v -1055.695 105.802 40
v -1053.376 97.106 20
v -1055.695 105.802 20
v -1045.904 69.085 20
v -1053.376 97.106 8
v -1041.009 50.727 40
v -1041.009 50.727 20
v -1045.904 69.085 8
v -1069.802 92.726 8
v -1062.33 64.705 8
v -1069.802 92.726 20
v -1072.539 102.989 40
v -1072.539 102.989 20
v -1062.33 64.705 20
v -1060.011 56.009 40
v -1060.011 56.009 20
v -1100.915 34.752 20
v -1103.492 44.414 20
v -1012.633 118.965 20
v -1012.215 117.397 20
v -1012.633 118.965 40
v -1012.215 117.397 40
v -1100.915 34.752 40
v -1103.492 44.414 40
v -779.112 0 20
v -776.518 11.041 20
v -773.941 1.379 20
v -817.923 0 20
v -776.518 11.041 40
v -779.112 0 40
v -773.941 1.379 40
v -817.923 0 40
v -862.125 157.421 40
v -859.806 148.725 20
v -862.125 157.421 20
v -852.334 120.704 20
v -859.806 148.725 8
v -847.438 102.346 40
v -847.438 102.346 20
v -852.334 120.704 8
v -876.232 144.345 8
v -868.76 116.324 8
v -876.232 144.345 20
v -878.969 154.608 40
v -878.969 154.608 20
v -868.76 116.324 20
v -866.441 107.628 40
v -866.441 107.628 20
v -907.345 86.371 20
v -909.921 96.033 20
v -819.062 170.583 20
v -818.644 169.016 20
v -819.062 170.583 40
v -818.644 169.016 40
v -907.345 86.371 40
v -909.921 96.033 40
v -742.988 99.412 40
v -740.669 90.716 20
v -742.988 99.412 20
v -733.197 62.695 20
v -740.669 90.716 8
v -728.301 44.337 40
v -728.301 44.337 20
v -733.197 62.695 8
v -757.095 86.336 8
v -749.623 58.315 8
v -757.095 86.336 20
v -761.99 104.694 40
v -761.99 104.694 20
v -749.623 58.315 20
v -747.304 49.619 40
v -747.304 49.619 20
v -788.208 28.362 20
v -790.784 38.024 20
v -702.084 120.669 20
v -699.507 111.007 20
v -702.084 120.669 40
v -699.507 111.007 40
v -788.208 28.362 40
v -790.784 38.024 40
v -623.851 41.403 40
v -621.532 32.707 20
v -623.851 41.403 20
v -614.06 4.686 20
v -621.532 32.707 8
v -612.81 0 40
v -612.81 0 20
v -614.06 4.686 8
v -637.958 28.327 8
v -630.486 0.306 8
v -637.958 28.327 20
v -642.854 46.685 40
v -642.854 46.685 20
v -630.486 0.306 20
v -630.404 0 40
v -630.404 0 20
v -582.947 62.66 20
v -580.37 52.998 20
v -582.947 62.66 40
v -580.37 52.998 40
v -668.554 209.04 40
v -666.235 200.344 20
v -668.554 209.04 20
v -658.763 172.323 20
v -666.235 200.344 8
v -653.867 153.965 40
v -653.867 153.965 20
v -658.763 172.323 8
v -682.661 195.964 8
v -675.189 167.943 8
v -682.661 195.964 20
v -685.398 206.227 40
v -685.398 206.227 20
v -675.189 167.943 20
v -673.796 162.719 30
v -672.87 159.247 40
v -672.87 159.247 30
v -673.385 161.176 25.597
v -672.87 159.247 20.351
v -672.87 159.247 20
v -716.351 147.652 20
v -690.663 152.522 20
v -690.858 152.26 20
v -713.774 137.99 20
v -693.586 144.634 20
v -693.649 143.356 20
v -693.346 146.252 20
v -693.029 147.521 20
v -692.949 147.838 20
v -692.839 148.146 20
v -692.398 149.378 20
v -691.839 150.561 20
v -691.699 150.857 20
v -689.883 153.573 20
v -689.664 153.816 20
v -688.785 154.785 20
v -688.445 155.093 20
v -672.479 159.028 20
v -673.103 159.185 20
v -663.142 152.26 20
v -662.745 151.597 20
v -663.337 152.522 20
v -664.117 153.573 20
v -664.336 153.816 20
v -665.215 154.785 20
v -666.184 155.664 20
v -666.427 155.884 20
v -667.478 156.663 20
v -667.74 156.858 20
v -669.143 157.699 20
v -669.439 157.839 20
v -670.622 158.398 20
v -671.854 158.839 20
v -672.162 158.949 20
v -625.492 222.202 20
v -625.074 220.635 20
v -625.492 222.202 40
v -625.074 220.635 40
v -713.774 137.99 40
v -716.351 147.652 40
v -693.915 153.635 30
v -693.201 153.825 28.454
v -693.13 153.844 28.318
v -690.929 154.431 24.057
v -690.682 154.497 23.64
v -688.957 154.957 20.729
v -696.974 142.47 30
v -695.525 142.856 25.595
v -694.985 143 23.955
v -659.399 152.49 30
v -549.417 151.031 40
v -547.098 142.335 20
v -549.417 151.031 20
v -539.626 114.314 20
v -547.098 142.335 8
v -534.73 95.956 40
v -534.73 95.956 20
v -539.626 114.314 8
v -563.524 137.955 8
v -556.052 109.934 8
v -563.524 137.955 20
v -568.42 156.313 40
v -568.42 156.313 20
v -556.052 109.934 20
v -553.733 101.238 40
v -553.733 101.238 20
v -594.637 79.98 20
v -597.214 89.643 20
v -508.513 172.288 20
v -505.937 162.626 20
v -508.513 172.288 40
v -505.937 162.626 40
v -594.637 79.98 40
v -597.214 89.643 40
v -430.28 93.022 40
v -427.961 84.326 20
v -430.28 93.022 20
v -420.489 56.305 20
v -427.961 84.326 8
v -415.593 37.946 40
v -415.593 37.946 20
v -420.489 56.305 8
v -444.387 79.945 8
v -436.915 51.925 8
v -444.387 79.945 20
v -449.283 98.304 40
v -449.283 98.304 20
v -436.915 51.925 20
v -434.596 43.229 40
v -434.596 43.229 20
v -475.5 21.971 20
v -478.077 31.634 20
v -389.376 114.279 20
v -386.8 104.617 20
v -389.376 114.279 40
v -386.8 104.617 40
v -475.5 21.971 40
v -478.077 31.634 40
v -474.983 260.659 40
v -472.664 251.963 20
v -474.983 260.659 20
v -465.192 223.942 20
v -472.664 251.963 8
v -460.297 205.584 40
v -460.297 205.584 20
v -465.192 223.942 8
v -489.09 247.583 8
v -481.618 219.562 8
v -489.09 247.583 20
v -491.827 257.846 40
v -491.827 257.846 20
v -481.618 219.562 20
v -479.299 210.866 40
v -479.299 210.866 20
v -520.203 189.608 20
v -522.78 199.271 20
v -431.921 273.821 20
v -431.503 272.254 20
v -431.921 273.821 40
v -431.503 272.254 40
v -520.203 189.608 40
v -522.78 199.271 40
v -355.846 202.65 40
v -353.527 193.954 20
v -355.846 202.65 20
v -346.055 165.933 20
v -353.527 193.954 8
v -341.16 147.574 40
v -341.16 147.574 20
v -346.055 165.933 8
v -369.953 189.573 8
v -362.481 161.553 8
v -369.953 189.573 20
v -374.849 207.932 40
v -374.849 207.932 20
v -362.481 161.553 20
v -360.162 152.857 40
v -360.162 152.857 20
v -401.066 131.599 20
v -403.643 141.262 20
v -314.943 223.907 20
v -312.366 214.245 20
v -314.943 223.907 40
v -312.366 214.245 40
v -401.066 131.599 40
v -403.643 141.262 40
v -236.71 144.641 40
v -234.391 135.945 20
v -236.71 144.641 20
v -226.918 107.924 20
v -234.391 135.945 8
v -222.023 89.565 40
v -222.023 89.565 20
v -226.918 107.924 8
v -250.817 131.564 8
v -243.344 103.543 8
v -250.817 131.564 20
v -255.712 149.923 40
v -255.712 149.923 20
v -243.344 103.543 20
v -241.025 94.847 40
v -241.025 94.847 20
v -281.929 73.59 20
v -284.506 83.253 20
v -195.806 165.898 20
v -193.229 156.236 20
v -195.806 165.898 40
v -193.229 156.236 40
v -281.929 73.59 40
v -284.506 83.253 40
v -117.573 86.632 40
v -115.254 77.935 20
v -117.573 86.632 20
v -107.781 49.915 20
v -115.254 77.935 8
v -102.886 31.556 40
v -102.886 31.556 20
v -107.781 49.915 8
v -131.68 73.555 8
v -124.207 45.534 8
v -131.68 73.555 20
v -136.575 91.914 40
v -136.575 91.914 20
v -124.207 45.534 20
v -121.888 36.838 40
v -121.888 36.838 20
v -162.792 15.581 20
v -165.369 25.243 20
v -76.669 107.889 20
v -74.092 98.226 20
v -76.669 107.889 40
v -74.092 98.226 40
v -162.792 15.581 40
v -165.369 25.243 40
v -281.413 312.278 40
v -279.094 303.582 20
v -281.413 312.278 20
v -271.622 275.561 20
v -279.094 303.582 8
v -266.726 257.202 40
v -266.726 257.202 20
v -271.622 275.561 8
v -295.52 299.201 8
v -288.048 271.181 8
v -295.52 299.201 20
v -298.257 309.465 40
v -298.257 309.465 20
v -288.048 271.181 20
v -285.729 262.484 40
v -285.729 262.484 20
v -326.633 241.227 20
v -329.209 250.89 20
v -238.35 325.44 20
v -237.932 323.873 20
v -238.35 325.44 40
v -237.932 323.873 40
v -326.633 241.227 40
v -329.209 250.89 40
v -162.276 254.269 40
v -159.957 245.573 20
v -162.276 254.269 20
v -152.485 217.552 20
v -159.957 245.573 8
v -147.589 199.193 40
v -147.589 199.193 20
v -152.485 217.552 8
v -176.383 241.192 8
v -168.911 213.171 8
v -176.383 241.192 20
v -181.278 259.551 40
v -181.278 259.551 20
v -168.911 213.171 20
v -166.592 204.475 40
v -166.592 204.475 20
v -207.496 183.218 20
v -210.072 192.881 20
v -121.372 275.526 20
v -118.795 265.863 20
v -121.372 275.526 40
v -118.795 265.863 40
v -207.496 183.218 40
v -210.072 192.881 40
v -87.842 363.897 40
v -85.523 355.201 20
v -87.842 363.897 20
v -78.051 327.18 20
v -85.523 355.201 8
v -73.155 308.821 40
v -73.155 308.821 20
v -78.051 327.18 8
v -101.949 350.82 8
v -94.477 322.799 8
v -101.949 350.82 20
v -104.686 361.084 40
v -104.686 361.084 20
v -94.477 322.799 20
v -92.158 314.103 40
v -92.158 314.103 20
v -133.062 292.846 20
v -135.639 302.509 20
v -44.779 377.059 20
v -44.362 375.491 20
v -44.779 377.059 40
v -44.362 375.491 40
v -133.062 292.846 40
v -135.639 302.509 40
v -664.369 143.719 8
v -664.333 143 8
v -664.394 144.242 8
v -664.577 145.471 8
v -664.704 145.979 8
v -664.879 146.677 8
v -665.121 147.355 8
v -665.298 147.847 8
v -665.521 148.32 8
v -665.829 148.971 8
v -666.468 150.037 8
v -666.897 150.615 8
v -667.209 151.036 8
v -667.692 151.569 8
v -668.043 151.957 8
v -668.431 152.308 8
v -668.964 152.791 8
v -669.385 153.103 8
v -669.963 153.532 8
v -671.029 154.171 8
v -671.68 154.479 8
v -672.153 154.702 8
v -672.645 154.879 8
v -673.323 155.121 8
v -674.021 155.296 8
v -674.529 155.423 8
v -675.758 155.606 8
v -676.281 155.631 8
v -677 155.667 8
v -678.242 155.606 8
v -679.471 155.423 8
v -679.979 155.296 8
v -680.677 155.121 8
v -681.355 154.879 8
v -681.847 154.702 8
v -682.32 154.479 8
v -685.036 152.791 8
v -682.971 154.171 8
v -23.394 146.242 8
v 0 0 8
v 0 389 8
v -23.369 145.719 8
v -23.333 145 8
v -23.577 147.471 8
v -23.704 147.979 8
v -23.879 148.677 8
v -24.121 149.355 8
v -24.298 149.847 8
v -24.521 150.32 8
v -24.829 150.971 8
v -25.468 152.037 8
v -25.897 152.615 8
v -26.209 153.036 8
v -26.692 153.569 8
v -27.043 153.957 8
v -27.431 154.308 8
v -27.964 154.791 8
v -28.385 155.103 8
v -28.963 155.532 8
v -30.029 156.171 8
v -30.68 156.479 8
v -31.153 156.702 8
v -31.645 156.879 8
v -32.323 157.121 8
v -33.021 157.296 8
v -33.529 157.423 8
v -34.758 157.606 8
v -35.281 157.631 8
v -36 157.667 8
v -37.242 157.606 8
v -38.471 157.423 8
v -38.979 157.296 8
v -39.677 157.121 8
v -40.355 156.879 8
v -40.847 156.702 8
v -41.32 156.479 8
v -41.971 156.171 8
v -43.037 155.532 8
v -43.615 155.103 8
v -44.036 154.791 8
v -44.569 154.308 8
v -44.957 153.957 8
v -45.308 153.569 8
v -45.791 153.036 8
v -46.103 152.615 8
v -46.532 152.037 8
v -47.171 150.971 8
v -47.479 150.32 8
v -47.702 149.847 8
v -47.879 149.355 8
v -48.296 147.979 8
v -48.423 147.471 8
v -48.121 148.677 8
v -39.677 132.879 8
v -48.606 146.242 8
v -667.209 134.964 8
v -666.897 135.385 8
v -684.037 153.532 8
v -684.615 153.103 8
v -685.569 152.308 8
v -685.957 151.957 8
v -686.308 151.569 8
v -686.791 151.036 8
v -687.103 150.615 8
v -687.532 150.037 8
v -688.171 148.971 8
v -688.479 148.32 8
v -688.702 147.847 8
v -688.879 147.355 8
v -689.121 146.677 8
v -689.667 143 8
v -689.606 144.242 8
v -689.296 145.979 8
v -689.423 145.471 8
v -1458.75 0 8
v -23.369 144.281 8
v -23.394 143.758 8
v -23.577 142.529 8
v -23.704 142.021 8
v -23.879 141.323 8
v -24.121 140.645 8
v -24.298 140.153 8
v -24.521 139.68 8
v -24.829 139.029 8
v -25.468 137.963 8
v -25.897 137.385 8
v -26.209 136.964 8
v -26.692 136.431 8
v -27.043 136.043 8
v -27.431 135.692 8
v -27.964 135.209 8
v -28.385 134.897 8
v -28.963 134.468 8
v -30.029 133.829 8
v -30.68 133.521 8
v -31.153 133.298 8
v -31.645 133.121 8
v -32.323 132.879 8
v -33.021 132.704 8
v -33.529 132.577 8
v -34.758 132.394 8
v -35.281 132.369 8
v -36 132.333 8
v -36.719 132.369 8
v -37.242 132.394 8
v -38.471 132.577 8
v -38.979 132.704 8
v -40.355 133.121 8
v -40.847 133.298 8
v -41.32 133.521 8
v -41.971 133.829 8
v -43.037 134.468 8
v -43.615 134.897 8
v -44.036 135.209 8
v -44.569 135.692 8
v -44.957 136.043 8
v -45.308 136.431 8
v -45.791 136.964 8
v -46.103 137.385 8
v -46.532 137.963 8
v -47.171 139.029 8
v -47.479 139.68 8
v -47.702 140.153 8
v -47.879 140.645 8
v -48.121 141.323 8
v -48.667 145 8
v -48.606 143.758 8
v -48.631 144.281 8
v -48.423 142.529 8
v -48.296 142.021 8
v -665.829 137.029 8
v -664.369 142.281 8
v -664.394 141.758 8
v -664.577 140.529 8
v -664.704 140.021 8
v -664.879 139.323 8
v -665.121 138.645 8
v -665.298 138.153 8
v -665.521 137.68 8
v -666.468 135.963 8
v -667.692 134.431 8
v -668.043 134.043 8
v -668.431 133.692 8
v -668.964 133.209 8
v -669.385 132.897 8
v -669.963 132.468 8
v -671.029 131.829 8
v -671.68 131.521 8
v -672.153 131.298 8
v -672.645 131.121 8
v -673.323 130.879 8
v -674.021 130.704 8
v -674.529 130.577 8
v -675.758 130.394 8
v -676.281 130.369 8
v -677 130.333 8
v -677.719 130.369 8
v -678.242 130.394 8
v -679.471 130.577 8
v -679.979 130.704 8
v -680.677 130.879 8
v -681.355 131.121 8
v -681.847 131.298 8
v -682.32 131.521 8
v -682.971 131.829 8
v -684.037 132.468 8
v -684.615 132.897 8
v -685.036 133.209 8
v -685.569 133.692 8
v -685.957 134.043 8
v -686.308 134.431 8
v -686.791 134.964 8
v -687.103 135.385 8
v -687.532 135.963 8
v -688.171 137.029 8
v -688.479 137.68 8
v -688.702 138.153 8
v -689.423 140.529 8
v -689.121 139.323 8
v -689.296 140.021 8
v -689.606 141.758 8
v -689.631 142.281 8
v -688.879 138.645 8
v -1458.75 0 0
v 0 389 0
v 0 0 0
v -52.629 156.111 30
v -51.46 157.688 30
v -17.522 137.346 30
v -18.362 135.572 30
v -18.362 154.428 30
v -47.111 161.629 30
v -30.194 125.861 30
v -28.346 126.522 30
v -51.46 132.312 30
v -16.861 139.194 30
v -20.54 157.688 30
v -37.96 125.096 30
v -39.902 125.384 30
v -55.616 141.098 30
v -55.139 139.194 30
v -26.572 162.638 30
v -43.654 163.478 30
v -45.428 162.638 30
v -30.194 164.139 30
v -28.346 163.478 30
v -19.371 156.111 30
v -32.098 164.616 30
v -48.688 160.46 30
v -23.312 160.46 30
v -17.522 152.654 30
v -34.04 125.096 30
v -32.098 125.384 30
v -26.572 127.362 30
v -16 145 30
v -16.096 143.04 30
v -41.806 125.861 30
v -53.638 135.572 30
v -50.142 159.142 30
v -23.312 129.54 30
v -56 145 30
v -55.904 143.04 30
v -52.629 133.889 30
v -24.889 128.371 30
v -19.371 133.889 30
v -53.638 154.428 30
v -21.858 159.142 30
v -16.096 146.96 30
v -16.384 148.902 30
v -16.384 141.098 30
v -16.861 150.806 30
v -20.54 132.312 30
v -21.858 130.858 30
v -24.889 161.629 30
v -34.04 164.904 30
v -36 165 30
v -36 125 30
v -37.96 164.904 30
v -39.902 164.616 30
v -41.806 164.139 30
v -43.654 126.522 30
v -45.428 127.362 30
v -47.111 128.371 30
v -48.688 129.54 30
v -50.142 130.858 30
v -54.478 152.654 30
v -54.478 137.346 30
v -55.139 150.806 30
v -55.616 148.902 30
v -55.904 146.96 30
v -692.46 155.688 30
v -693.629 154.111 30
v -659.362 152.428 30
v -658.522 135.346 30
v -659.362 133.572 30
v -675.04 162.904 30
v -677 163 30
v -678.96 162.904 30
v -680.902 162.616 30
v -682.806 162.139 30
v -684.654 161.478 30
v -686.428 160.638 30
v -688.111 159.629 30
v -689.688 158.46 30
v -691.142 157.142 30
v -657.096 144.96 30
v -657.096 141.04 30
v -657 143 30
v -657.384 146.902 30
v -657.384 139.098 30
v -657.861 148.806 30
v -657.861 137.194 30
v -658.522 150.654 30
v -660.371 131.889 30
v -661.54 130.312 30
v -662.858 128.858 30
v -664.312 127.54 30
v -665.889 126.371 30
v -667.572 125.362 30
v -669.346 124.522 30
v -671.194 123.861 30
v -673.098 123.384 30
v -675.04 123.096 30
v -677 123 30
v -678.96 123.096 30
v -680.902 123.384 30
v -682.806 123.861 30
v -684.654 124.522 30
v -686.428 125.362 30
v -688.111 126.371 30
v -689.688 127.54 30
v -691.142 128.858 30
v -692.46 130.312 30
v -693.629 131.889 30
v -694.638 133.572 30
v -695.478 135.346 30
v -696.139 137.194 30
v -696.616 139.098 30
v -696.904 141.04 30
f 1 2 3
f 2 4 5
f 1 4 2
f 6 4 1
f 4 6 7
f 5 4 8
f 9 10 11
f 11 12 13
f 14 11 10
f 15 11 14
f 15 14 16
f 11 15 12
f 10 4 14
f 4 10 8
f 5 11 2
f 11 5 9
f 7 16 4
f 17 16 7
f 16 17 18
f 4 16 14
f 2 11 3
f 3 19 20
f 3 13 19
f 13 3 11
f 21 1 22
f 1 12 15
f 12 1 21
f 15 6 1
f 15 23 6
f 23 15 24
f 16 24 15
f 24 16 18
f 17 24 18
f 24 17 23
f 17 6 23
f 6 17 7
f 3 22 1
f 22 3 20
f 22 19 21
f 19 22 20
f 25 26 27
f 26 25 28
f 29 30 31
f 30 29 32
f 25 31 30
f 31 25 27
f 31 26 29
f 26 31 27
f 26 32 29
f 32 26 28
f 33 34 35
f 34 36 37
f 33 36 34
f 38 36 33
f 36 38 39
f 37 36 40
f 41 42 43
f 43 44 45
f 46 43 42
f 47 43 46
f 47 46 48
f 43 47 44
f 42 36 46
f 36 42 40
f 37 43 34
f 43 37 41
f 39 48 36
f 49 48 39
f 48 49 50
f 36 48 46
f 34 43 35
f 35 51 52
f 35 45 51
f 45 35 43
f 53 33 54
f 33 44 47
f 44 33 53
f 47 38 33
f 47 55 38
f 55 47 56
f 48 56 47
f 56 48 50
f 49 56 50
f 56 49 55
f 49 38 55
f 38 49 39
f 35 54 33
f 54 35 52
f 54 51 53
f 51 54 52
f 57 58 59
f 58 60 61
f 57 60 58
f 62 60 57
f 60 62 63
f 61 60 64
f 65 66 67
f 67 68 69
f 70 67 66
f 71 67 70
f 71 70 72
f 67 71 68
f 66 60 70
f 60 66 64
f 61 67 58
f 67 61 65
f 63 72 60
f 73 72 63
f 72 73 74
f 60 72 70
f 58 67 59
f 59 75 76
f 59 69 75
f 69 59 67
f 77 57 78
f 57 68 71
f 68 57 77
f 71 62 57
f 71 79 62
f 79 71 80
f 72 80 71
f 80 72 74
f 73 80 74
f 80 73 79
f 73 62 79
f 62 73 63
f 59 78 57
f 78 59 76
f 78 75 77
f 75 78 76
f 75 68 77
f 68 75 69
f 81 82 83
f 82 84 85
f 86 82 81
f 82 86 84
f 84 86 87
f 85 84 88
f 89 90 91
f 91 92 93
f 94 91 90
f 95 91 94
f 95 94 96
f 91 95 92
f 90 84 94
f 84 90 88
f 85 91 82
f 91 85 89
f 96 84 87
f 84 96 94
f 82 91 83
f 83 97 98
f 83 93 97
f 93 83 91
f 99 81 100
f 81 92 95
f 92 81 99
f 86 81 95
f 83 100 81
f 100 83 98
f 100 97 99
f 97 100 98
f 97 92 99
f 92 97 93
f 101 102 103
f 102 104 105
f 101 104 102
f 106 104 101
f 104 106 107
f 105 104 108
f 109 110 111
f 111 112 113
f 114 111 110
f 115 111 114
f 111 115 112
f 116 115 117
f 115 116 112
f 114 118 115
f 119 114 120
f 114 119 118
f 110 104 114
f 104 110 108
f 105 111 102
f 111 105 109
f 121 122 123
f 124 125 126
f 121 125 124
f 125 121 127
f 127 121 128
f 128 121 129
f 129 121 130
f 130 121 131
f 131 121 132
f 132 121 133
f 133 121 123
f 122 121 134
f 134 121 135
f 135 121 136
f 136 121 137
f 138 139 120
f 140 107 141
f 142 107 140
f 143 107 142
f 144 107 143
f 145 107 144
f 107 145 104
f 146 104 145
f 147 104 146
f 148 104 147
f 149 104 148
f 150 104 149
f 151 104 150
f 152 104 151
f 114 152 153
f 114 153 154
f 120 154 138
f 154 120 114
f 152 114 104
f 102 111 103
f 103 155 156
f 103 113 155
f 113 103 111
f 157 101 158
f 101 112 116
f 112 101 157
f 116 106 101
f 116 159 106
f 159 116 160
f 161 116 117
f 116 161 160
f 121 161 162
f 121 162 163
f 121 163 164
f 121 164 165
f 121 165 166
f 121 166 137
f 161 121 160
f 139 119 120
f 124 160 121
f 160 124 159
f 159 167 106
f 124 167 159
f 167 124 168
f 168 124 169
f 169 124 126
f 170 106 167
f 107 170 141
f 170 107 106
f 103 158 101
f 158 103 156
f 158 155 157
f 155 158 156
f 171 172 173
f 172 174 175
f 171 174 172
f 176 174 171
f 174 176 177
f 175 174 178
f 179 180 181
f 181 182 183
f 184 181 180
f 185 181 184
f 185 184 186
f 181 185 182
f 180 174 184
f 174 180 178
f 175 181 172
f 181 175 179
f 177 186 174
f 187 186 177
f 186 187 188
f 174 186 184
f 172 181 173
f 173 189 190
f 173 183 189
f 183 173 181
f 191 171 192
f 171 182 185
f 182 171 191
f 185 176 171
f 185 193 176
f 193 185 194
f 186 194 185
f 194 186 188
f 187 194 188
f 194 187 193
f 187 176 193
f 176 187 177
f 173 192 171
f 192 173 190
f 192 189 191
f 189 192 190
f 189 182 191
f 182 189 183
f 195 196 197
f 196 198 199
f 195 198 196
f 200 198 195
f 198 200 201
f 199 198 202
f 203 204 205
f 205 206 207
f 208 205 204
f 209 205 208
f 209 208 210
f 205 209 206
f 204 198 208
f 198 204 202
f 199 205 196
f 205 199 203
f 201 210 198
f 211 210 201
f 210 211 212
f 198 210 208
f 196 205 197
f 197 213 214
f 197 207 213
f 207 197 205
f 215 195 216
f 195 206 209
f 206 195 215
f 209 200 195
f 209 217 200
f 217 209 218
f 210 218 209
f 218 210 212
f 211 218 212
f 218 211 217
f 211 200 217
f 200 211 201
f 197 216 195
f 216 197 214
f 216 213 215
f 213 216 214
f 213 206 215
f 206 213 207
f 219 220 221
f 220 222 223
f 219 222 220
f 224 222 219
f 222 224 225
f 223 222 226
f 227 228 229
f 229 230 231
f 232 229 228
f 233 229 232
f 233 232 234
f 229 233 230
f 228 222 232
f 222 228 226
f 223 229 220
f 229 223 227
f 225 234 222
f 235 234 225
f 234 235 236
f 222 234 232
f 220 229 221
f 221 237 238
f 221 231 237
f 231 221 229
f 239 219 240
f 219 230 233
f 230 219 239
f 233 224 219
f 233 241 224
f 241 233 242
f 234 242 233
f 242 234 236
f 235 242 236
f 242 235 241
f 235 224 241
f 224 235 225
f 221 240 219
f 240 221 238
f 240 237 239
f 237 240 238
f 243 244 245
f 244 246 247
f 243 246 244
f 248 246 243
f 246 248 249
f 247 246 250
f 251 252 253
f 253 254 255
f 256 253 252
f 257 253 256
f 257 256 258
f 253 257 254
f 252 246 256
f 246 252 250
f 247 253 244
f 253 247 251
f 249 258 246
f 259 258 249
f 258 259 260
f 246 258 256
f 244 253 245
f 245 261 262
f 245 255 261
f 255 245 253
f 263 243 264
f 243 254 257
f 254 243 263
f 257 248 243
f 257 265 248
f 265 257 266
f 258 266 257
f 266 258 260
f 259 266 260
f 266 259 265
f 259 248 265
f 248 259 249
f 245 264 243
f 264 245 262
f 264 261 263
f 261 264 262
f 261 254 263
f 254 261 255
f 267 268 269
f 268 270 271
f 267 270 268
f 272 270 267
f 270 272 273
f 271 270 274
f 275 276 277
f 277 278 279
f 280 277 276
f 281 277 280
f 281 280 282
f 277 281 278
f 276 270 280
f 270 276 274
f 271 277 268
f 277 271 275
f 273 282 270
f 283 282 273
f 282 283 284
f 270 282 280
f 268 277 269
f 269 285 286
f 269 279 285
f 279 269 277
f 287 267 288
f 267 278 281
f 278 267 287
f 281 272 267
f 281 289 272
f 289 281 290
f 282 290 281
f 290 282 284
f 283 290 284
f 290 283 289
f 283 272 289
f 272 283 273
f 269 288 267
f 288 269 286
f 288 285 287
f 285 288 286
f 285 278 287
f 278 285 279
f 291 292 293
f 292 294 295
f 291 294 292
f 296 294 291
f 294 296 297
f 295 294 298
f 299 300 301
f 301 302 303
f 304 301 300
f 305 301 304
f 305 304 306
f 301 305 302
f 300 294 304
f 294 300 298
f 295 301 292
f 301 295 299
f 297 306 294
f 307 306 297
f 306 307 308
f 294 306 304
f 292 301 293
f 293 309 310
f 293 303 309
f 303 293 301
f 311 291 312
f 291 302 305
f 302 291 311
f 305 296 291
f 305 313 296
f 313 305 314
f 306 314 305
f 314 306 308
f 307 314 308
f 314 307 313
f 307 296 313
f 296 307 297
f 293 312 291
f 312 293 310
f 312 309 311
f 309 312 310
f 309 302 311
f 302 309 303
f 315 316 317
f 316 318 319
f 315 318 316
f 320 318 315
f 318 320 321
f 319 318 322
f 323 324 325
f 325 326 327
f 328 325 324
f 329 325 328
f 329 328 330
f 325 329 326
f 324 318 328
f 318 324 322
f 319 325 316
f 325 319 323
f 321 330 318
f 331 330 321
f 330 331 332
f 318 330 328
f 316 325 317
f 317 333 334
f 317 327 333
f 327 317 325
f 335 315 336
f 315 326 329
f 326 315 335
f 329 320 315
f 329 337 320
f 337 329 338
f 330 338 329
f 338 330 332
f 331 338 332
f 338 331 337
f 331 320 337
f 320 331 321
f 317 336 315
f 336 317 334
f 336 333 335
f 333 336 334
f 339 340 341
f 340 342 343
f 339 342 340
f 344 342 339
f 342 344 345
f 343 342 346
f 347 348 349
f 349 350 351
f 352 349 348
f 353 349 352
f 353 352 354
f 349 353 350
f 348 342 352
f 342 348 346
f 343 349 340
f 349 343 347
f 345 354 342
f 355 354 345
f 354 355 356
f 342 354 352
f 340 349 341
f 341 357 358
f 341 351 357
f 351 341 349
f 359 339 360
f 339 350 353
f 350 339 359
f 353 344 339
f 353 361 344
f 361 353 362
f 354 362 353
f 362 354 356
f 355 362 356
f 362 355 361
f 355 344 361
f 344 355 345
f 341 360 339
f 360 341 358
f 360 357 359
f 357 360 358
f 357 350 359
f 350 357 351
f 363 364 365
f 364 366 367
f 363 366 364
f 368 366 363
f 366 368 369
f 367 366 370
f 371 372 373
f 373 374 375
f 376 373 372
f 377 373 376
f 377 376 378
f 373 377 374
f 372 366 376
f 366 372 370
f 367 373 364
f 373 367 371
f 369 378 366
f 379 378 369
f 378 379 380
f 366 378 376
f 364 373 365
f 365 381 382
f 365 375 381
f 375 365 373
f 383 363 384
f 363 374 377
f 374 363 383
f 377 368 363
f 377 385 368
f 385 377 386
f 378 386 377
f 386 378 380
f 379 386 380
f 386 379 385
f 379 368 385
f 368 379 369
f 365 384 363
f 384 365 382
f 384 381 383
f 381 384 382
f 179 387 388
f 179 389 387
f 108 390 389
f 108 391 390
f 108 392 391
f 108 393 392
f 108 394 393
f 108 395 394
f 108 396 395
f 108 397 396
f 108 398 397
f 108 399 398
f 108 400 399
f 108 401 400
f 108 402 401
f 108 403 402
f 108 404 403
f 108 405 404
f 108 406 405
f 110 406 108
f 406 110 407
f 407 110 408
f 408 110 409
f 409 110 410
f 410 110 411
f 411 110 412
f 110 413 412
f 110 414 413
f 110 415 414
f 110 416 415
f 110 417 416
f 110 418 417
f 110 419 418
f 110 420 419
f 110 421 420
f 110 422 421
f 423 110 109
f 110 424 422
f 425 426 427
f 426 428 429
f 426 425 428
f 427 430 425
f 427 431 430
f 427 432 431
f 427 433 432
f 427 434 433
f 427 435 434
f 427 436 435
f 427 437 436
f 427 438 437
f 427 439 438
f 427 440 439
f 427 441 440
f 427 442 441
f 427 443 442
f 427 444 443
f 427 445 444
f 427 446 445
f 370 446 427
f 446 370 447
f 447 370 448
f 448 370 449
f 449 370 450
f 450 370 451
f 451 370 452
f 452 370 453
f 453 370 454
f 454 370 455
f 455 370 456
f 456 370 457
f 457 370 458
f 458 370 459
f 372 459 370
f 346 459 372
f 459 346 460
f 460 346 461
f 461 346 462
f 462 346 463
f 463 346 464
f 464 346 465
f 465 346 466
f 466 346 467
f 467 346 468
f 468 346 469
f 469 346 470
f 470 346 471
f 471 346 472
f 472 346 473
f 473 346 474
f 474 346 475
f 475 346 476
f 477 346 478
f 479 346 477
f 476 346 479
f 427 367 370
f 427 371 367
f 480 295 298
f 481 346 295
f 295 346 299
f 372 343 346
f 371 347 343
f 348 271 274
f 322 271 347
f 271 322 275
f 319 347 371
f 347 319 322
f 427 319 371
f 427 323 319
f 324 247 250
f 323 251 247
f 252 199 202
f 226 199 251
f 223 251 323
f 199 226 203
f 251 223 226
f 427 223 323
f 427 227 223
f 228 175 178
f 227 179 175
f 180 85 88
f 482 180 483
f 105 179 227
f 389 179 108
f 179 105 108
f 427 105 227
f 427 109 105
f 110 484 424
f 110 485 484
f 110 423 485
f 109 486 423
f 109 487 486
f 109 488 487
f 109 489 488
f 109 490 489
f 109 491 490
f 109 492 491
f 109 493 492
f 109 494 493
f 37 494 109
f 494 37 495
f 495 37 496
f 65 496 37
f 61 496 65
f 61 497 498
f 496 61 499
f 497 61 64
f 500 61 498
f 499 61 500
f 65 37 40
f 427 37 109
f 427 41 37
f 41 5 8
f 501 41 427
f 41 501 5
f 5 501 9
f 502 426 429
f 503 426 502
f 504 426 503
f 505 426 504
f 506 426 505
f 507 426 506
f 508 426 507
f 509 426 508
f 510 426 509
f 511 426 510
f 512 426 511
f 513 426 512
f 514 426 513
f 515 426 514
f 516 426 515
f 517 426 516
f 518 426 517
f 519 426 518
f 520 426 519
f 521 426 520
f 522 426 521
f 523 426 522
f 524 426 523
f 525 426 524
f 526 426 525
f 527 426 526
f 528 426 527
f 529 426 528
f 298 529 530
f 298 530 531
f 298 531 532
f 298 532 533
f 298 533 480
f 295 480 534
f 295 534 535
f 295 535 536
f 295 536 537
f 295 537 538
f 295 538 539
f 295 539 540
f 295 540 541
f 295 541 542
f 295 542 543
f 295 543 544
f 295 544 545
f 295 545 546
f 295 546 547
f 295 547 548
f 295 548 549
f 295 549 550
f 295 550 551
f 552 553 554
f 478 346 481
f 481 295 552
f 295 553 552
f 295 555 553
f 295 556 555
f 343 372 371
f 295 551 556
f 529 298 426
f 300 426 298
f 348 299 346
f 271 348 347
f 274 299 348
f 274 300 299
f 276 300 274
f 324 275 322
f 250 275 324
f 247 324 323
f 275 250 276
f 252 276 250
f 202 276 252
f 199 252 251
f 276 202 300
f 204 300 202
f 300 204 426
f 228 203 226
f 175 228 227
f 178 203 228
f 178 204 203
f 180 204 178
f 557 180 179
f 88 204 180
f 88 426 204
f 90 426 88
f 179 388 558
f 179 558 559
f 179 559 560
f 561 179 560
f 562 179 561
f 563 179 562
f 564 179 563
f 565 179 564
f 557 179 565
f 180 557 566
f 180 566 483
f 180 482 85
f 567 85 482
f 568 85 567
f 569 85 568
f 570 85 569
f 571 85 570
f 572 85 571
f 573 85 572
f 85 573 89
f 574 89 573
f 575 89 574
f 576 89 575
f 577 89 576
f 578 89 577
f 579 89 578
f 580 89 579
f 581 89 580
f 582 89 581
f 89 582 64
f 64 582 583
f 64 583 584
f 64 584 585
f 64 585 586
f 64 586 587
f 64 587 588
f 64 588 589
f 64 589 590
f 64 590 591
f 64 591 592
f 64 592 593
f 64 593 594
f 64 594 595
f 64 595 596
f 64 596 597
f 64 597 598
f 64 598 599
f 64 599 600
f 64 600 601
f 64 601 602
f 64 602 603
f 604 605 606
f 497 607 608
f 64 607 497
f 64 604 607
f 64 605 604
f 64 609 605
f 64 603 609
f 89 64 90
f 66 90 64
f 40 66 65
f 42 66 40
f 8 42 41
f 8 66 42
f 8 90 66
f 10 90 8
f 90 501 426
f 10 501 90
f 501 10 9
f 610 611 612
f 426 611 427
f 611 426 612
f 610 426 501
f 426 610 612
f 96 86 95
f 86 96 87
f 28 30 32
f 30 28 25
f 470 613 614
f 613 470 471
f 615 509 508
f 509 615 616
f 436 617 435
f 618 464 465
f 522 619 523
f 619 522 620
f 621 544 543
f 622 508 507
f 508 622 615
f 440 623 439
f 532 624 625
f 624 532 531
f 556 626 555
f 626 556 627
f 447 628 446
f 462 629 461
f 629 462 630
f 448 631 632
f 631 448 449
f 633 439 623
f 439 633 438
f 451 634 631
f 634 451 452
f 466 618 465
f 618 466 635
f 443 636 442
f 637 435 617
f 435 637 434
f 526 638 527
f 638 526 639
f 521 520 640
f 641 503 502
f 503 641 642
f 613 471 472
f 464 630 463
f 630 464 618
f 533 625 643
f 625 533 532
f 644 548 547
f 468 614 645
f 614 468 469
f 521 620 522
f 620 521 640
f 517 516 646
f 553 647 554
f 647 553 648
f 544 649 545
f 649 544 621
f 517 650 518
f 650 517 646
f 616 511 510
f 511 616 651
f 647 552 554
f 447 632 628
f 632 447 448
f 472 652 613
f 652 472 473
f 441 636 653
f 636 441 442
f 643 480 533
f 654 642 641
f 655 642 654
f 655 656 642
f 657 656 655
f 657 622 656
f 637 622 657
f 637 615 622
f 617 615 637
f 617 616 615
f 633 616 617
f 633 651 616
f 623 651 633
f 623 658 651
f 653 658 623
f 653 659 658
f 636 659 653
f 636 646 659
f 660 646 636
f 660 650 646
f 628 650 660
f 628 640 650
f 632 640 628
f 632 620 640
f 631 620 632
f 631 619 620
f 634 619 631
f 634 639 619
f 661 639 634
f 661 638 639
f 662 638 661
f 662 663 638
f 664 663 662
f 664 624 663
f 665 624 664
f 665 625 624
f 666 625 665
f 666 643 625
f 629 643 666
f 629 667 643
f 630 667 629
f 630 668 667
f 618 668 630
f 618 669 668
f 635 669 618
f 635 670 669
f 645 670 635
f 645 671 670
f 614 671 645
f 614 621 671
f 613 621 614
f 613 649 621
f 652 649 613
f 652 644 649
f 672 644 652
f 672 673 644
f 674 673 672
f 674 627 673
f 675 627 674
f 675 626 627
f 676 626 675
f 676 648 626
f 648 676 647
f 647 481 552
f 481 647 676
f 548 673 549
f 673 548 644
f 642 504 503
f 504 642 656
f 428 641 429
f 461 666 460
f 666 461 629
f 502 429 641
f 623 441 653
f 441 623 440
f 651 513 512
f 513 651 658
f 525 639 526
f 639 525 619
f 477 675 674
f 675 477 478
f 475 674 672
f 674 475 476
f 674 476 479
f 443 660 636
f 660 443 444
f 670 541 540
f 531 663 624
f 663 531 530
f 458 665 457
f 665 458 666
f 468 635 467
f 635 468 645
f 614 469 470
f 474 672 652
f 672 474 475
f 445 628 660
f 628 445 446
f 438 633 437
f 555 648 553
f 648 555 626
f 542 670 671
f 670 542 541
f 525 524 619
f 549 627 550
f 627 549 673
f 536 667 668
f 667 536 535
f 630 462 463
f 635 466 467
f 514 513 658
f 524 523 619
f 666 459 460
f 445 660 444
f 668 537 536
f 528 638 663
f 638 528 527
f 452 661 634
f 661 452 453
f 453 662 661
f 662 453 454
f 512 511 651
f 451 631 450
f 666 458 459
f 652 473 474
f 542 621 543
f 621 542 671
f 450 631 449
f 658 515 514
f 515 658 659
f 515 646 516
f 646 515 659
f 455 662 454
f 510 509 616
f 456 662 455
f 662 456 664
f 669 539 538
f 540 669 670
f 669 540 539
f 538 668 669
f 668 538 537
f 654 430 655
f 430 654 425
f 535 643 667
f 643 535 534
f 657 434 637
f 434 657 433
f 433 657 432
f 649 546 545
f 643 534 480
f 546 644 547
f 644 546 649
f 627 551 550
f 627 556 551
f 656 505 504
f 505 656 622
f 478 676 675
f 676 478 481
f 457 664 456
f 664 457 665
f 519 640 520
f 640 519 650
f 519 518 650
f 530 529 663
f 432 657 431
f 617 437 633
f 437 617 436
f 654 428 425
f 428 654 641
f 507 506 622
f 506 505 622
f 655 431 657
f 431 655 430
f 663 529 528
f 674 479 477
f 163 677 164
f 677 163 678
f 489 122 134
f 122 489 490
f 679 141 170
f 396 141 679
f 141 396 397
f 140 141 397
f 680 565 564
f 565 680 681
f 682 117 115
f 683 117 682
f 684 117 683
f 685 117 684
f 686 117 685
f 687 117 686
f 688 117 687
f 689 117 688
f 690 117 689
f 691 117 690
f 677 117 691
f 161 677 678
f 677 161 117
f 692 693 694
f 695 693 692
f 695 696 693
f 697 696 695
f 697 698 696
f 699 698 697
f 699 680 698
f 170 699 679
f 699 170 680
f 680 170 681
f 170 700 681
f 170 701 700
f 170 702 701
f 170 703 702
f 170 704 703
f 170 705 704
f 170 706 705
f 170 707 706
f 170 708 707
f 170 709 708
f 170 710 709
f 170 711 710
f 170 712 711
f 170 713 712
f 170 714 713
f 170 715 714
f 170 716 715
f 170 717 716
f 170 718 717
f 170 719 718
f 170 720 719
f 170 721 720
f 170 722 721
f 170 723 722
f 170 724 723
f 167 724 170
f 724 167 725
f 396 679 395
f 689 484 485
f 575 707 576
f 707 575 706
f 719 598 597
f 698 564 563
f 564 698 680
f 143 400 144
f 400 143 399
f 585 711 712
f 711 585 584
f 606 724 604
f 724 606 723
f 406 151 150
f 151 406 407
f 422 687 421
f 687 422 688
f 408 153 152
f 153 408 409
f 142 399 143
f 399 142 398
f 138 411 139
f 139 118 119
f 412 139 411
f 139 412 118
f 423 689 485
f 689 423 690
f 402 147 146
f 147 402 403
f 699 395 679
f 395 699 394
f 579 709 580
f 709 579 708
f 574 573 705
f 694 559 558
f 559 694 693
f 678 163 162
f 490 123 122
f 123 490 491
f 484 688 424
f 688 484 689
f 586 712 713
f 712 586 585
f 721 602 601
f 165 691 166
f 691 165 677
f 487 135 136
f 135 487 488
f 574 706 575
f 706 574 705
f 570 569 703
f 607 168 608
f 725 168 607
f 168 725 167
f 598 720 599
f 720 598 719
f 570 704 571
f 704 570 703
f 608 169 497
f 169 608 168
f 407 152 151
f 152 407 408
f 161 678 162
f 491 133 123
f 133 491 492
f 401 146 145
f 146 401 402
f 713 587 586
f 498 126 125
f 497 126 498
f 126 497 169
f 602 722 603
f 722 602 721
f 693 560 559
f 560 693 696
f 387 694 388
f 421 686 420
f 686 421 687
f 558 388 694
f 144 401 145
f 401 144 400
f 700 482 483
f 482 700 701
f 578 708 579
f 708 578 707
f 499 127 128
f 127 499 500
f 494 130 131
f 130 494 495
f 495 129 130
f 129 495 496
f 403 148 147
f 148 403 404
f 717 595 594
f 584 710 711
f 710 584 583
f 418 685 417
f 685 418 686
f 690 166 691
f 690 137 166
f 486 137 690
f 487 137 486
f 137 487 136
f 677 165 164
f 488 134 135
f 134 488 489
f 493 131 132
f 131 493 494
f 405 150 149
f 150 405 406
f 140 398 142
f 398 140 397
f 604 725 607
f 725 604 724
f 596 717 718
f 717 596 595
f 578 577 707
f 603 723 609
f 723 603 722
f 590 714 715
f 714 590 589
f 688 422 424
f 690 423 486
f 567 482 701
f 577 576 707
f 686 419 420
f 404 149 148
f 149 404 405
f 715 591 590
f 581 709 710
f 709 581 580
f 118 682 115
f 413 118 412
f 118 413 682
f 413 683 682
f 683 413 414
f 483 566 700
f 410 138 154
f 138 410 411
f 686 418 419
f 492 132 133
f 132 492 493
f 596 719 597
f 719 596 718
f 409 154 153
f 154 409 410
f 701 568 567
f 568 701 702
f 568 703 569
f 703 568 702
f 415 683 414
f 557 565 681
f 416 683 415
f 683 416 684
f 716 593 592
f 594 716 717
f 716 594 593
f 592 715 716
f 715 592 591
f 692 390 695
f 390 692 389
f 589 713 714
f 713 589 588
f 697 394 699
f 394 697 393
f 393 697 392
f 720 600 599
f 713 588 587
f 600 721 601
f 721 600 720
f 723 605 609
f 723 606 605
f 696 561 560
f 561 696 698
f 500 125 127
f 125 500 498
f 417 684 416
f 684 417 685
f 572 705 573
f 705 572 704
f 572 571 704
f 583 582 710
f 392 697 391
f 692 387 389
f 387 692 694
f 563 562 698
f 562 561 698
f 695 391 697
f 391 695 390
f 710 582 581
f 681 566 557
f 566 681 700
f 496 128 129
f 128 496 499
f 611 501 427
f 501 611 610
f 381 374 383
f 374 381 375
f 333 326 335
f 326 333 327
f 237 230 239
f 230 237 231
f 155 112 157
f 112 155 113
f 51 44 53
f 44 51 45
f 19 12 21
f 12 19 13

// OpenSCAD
$fn=64;


lost=11;
H0=400;
H=H0-lost;
L=1500*H/H0;
echo("L",L);
Q=206*H/H0;
C=sqrt(H*H+L*L);
echo("C",C);
HANGER_D=10;

module hangers() {
    intersection() {
        union() {
            hangerBase();
            hangerPoles();
            wallHook(36,145);
            wallHook(677,143);
        }
        hangerRange();
    }
}

module hangerPoles() {
    q=12;//(7.7+16.1)/2;
    x0=90;
    y0=50;
    echo("q",q);
    a=atan2(L,H);
   translate([0,H,0])
   rotate(90+a)
    for(ix=[-5:0])
    for(iy=[-0:3]) {
        x=(ix+iy/2)*Q       + cos(90+a) * x0 - sin(90+a)*y0;
        y=iy*sqrt(3)/4*Q    - sin(90+a) * x0 - cos(90+a)*y0;
        px=-x;
        py=y;
        if( 
            (py>250 && px>200 && px <300) ||
                px>0  && py<250
                && py-px < 0
                && (py<100 || ( px < 1000)) 
                && (py<200 || ( px < 600))  ) {
            echo("hanger",round(px),round(py)-q/2);
            translate([x,y,0]) {
                hanger();
            }
        }
    }
}
module hanger() {
    color([0,1,0]){
        cube([17,29,50],center=true);
        translate([0,0,20])
        mirror([1,0,0])
        linear_extrude(20) {
            A=62-17/2;
            B=57/2+5;B0=B-10;
            C=17/2;
            polygon(
                [
                    [-A,-B],
                    [C,-B],
                    [C,B0],
                    [A,B0],
                    [A,B],
                    [-C,B],
                    [-C,-B0],
                    [-A,-B0]
                ]
            );
        }
//        cube([17,29,30],center=true);
        
    }
//    17,29
//    2*62-17,57
//    cylinder(100,HANGER_D,HANGER_D);
}

module hangerBase() {
    cube([L,H,8]);
}
module wallHook(x,y) {
    translate([x,y,0])
    color([1,0,0])
    cylinder(30,HANGER_D,HANGER_D*2);
}


module hangerRange() {
    linear_extrude(200) {
        polygon(
            [
                [0,0],
                [L,0],
                [0,H],
                [0,0]
            ]
        );
    }
}


mirror([1,0,0])
hangers();
